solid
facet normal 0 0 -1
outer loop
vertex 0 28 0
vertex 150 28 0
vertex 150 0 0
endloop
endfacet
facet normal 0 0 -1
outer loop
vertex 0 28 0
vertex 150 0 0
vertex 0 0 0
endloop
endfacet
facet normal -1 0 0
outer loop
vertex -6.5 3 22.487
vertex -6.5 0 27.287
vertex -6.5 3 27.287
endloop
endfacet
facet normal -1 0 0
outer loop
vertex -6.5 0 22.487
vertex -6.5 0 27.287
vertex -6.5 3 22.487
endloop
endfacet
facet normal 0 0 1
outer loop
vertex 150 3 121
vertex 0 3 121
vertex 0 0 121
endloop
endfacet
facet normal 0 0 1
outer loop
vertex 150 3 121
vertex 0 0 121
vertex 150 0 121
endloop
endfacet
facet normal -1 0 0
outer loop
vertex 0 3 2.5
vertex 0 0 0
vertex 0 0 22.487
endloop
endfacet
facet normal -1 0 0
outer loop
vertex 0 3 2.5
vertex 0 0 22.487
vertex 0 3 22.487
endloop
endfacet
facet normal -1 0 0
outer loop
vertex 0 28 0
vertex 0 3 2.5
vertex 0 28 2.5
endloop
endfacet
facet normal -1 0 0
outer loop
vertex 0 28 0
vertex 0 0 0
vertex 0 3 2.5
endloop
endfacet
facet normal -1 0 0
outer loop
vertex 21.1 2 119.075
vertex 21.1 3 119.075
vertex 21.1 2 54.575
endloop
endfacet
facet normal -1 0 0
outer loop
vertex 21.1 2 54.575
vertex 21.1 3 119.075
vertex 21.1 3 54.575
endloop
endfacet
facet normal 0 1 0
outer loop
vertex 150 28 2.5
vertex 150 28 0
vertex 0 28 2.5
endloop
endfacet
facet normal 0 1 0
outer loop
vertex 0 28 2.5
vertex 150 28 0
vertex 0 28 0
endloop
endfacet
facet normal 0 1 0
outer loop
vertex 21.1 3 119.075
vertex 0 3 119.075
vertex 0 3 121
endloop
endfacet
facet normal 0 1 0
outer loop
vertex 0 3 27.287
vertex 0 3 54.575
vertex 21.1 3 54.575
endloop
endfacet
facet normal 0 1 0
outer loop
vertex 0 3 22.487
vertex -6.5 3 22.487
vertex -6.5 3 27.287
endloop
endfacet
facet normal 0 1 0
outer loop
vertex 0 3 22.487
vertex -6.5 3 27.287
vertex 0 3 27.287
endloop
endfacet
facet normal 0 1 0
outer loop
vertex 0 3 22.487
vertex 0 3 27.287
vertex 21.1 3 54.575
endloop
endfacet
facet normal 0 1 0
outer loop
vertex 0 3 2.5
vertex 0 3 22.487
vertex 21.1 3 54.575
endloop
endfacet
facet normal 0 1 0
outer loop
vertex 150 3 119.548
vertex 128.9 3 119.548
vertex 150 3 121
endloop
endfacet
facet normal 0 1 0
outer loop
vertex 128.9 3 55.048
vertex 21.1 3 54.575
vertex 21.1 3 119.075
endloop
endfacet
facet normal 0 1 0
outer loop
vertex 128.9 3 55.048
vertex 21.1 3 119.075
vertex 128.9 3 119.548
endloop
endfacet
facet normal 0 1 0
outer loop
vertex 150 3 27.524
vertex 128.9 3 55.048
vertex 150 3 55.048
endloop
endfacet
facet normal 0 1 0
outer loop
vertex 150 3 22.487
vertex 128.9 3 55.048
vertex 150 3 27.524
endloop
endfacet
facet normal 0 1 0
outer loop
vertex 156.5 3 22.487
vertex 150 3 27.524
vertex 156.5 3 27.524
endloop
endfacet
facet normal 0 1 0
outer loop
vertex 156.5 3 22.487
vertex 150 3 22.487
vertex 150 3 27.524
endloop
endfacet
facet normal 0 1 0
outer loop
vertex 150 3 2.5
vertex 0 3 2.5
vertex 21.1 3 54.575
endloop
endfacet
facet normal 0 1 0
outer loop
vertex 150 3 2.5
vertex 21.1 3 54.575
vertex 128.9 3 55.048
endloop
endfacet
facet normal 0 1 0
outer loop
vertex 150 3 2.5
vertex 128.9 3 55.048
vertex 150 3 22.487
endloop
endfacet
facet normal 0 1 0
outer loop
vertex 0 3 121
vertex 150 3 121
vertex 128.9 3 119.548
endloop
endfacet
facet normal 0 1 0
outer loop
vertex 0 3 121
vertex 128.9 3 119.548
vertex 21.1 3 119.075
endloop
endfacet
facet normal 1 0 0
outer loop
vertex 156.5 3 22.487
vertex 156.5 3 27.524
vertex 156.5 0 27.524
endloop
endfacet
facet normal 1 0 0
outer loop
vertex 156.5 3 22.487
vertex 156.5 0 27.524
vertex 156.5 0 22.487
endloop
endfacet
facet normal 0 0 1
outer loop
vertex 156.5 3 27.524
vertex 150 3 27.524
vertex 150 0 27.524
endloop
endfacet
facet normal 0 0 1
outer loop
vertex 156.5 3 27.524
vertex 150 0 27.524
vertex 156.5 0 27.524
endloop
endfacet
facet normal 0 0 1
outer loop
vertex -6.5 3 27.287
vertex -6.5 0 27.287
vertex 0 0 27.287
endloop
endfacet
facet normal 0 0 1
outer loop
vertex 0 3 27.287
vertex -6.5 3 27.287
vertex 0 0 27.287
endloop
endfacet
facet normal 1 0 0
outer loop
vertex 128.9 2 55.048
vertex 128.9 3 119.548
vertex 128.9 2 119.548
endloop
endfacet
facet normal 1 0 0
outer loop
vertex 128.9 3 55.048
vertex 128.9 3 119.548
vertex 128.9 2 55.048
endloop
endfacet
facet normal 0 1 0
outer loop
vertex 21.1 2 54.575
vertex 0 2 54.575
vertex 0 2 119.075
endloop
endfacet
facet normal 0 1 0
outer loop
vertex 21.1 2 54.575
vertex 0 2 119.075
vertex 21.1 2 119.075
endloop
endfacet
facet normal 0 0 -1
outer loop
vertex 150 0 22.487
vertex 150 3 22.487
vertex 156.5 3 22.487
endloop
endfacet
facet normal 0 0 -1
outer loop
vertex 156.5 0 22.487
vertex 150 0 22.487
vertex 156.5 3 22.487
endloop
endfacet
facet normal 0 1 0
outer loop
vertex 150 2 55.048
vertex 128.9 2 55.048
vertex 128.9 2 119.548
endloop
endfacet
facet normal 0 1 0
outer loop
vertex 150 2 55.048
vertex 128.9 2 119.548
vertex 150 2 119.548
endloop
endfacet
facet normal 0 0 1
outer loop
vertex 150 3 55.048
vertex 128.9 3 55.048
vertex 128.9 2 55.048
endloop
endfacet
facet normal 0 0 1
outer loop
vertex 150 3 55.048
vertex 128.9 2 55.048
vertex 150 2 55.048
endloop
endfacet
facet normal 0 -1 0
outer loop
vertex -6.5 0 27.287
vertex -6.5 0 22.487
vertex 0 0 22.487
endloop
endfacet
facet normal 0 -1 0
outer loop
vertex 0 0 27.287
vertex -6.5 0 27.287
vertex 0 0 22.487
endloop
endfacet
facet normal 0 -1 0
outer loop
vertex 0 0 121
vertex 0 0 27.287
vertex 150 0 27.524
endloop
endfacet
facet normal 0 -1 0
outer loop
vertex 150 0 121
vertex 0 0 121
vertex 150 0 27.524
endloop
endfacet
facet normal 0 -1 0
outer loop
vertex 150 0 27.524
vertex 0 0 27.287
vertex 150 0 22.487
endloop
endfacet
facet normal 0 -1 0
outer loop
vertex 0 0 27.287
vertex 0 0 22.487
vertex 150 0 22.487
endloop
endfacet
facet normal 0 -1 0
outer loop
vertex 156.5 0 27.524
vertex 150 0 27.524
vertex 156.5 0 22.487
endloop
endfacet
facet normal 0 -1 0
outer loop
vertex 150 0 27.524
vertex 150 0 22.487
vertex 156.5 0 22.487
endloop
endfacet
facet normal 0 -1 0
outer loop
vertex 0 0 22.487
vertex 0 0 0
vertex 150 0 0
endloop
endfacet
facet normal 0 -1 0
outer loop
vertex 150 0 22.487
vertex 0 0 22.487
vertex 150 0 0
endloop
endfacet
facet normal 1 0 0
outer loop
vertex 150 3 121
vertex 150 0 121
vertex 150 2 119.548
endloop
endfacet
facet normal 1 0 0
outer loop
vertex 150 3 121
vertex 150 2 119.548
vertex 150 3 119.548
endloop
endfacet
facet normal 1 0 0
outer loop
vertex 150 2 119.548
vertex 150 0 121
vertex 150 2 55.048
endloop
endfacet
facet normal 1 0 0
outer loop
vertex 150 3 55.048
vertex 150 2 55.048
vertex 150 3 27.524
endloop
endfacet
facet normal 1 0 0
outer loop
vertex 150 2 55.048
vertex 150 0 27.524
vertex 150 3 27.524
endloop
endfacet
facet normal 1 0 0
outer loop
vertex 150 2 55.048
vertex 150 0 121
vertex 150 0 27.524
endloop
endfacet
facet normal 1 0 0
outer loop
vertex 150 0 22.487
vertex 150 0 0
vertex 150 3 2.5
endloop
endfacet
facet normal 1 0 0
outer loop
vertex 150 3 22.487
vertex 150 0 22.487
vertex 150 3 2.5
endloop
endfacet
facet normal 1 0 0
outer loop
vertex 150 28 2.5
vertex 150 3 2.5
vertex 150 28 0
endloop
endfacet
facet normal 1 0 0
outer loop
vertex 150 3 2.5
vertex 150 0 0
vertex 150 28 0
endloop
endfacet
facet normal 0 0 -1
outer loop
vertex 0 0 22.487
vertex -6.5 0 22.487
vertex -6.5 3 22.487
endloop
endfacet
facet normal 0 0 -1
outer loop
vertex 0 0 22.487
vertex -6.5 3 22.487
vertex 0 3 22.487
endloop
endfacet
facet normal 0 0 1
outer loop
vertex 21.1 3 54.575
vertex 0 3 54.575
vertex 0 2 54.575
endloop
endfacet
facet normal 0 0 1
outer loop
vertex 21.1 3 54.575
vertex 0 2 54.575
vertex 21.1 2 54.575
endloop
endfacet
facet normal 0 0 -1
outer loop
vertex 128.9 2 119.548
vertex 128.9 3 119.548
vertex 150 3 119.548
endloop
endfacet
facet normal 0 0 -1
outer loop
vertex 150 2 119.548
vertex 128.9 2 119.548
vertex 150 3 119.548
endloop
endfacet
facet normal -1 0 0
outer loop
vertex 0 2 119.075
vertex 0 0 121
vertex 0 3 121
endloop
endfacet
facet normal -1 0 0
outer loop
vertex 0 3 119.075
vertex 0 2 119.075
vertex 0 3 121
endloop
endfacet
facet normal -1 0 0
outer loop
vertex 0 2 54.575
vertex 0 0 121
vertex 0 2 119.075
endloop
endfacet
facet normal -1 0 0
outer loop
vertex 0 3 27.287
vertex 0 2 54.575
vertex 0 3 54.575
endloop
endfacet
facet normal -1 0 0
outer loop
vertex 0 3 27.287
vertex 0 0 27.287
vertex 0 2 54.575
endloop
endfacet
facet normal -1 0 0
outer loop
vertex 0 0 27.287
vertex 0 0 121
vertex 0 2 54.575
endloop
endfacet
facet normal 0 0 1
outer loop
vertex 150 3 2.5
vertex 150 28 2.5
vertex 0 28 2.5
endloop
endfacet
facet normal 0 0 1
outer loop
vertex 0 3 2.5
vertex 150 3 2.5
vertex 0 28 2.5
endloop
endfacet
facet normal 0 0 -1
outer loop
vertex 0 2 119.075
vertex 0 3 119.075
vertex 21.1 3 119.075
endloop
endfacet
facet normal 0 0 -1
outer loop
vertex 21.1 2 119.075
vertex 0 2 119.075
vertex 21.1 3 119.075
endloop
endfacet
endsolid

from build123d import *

# Parameters (mm, degrees)
SKETCH1_W           = 150
SKETCH1_H           = 3
BOSS_EXTRUDE1_DEPTH = 121
SKETCH3_W           = 21.1
SKETCH3_H           = 64.5
CUT_EXTRUDE1_DEPTH  = 1
SKETCH4_W           = 21.1
SKETCH4_H           = 64.5
CUT_EXTRUDE2_DEPTH  = 1
SKETCH6_W           = 6.5
SKETCH6_H           = 4.8
BOSS_EXTRUDE5_DEPTH = 3
SKETCH9_W           = 6.5
SKETCH9_H           = 5.03681905
BOSS_EXTRUDE7_DEPTH = 3
SKETCH10_W          = 150
SKETCH10_H          = 25
BOSS_EXTRUDE8_DEPTH = 2.5


with BuildPart() as part:
    # Sketch1 → Boss-Extrude1 (new body)
    with BuildSketch(Plane.XY):
        with Locations((75, 1.5)):
            Rectangle(SKETCH1_W, SKETCH1_H)
    extrude(amount=BOSS_EXTRUDE1_DEPTH)

    # Sketch3 → Cut-Extrude1 (cut)
    with BuildSketch(Plane(origin=(0, 3, 0), x_dir=(1, 0, 0), z_dir=(0, 1, 0))):
        with Locations((10.55, -86.824661278)):
            Rectangle(SKETCH3_W, SKETCH3_H)
    extrude(amount=-CUT_EXTRUDE1_DEPTH, mode=Mode.SUBTRACT)

    # Sketch4 → Cut-Extrude2 (cut)
    with BuildSketch(Plane(origin=(0, 3, 0), x_dir=(1, 0, 0), z_dir=(0, 1, 0))):
        with Locations((139.45, -87.298299378)):
            Rectangle(SKETCH4_W, SKETCH4_H)
    extrude(amount=-CUT_EXTRUDE2_DEPTH, mode=Mode.SUBTRACT)

    # Sketch6 → Boss-Extrude5 (add)
    with BuildSketch(Plane(origin=(0, 0, 0), x_dir=(1, 0, 0), z_dir=(0, 1, 0))):
        with Locations((-3.25, -24.887330639)):
            Rectangle(SKETCH6_W, SKETCH6_H)
    extrude(amount=BOSS_EXTRUDE5_DEPTH)

    # Sketch9 → Boss-Extrude7 (add)
    with BuildSketch(Plane(origin=(0, 3, 0), x_dir=(1, 0, 0), z_dir=(0, 1, 0))):
        with Locations((153.25, -25.005740164)):
            Rectangle(SKETCH9_W, SKETCH9_H)
    extrude(amount=-BOSS_EXTRUDE7_DEPTH)

    # Sketch10 → Boss-Extrude8 (add)
    with BuildSketch(Plane(origin=(0, 0, 0), x_dir=(-1, 0, 0), z_dir=(0, 0, -1))):
        with Locations((-75, 15.5)):
            Rectangle(SKETCH10_W, SKETCH10_H)
    extrude(amount=-BOSS_EXTRUDE8_DEPTH)


solid = part.part
